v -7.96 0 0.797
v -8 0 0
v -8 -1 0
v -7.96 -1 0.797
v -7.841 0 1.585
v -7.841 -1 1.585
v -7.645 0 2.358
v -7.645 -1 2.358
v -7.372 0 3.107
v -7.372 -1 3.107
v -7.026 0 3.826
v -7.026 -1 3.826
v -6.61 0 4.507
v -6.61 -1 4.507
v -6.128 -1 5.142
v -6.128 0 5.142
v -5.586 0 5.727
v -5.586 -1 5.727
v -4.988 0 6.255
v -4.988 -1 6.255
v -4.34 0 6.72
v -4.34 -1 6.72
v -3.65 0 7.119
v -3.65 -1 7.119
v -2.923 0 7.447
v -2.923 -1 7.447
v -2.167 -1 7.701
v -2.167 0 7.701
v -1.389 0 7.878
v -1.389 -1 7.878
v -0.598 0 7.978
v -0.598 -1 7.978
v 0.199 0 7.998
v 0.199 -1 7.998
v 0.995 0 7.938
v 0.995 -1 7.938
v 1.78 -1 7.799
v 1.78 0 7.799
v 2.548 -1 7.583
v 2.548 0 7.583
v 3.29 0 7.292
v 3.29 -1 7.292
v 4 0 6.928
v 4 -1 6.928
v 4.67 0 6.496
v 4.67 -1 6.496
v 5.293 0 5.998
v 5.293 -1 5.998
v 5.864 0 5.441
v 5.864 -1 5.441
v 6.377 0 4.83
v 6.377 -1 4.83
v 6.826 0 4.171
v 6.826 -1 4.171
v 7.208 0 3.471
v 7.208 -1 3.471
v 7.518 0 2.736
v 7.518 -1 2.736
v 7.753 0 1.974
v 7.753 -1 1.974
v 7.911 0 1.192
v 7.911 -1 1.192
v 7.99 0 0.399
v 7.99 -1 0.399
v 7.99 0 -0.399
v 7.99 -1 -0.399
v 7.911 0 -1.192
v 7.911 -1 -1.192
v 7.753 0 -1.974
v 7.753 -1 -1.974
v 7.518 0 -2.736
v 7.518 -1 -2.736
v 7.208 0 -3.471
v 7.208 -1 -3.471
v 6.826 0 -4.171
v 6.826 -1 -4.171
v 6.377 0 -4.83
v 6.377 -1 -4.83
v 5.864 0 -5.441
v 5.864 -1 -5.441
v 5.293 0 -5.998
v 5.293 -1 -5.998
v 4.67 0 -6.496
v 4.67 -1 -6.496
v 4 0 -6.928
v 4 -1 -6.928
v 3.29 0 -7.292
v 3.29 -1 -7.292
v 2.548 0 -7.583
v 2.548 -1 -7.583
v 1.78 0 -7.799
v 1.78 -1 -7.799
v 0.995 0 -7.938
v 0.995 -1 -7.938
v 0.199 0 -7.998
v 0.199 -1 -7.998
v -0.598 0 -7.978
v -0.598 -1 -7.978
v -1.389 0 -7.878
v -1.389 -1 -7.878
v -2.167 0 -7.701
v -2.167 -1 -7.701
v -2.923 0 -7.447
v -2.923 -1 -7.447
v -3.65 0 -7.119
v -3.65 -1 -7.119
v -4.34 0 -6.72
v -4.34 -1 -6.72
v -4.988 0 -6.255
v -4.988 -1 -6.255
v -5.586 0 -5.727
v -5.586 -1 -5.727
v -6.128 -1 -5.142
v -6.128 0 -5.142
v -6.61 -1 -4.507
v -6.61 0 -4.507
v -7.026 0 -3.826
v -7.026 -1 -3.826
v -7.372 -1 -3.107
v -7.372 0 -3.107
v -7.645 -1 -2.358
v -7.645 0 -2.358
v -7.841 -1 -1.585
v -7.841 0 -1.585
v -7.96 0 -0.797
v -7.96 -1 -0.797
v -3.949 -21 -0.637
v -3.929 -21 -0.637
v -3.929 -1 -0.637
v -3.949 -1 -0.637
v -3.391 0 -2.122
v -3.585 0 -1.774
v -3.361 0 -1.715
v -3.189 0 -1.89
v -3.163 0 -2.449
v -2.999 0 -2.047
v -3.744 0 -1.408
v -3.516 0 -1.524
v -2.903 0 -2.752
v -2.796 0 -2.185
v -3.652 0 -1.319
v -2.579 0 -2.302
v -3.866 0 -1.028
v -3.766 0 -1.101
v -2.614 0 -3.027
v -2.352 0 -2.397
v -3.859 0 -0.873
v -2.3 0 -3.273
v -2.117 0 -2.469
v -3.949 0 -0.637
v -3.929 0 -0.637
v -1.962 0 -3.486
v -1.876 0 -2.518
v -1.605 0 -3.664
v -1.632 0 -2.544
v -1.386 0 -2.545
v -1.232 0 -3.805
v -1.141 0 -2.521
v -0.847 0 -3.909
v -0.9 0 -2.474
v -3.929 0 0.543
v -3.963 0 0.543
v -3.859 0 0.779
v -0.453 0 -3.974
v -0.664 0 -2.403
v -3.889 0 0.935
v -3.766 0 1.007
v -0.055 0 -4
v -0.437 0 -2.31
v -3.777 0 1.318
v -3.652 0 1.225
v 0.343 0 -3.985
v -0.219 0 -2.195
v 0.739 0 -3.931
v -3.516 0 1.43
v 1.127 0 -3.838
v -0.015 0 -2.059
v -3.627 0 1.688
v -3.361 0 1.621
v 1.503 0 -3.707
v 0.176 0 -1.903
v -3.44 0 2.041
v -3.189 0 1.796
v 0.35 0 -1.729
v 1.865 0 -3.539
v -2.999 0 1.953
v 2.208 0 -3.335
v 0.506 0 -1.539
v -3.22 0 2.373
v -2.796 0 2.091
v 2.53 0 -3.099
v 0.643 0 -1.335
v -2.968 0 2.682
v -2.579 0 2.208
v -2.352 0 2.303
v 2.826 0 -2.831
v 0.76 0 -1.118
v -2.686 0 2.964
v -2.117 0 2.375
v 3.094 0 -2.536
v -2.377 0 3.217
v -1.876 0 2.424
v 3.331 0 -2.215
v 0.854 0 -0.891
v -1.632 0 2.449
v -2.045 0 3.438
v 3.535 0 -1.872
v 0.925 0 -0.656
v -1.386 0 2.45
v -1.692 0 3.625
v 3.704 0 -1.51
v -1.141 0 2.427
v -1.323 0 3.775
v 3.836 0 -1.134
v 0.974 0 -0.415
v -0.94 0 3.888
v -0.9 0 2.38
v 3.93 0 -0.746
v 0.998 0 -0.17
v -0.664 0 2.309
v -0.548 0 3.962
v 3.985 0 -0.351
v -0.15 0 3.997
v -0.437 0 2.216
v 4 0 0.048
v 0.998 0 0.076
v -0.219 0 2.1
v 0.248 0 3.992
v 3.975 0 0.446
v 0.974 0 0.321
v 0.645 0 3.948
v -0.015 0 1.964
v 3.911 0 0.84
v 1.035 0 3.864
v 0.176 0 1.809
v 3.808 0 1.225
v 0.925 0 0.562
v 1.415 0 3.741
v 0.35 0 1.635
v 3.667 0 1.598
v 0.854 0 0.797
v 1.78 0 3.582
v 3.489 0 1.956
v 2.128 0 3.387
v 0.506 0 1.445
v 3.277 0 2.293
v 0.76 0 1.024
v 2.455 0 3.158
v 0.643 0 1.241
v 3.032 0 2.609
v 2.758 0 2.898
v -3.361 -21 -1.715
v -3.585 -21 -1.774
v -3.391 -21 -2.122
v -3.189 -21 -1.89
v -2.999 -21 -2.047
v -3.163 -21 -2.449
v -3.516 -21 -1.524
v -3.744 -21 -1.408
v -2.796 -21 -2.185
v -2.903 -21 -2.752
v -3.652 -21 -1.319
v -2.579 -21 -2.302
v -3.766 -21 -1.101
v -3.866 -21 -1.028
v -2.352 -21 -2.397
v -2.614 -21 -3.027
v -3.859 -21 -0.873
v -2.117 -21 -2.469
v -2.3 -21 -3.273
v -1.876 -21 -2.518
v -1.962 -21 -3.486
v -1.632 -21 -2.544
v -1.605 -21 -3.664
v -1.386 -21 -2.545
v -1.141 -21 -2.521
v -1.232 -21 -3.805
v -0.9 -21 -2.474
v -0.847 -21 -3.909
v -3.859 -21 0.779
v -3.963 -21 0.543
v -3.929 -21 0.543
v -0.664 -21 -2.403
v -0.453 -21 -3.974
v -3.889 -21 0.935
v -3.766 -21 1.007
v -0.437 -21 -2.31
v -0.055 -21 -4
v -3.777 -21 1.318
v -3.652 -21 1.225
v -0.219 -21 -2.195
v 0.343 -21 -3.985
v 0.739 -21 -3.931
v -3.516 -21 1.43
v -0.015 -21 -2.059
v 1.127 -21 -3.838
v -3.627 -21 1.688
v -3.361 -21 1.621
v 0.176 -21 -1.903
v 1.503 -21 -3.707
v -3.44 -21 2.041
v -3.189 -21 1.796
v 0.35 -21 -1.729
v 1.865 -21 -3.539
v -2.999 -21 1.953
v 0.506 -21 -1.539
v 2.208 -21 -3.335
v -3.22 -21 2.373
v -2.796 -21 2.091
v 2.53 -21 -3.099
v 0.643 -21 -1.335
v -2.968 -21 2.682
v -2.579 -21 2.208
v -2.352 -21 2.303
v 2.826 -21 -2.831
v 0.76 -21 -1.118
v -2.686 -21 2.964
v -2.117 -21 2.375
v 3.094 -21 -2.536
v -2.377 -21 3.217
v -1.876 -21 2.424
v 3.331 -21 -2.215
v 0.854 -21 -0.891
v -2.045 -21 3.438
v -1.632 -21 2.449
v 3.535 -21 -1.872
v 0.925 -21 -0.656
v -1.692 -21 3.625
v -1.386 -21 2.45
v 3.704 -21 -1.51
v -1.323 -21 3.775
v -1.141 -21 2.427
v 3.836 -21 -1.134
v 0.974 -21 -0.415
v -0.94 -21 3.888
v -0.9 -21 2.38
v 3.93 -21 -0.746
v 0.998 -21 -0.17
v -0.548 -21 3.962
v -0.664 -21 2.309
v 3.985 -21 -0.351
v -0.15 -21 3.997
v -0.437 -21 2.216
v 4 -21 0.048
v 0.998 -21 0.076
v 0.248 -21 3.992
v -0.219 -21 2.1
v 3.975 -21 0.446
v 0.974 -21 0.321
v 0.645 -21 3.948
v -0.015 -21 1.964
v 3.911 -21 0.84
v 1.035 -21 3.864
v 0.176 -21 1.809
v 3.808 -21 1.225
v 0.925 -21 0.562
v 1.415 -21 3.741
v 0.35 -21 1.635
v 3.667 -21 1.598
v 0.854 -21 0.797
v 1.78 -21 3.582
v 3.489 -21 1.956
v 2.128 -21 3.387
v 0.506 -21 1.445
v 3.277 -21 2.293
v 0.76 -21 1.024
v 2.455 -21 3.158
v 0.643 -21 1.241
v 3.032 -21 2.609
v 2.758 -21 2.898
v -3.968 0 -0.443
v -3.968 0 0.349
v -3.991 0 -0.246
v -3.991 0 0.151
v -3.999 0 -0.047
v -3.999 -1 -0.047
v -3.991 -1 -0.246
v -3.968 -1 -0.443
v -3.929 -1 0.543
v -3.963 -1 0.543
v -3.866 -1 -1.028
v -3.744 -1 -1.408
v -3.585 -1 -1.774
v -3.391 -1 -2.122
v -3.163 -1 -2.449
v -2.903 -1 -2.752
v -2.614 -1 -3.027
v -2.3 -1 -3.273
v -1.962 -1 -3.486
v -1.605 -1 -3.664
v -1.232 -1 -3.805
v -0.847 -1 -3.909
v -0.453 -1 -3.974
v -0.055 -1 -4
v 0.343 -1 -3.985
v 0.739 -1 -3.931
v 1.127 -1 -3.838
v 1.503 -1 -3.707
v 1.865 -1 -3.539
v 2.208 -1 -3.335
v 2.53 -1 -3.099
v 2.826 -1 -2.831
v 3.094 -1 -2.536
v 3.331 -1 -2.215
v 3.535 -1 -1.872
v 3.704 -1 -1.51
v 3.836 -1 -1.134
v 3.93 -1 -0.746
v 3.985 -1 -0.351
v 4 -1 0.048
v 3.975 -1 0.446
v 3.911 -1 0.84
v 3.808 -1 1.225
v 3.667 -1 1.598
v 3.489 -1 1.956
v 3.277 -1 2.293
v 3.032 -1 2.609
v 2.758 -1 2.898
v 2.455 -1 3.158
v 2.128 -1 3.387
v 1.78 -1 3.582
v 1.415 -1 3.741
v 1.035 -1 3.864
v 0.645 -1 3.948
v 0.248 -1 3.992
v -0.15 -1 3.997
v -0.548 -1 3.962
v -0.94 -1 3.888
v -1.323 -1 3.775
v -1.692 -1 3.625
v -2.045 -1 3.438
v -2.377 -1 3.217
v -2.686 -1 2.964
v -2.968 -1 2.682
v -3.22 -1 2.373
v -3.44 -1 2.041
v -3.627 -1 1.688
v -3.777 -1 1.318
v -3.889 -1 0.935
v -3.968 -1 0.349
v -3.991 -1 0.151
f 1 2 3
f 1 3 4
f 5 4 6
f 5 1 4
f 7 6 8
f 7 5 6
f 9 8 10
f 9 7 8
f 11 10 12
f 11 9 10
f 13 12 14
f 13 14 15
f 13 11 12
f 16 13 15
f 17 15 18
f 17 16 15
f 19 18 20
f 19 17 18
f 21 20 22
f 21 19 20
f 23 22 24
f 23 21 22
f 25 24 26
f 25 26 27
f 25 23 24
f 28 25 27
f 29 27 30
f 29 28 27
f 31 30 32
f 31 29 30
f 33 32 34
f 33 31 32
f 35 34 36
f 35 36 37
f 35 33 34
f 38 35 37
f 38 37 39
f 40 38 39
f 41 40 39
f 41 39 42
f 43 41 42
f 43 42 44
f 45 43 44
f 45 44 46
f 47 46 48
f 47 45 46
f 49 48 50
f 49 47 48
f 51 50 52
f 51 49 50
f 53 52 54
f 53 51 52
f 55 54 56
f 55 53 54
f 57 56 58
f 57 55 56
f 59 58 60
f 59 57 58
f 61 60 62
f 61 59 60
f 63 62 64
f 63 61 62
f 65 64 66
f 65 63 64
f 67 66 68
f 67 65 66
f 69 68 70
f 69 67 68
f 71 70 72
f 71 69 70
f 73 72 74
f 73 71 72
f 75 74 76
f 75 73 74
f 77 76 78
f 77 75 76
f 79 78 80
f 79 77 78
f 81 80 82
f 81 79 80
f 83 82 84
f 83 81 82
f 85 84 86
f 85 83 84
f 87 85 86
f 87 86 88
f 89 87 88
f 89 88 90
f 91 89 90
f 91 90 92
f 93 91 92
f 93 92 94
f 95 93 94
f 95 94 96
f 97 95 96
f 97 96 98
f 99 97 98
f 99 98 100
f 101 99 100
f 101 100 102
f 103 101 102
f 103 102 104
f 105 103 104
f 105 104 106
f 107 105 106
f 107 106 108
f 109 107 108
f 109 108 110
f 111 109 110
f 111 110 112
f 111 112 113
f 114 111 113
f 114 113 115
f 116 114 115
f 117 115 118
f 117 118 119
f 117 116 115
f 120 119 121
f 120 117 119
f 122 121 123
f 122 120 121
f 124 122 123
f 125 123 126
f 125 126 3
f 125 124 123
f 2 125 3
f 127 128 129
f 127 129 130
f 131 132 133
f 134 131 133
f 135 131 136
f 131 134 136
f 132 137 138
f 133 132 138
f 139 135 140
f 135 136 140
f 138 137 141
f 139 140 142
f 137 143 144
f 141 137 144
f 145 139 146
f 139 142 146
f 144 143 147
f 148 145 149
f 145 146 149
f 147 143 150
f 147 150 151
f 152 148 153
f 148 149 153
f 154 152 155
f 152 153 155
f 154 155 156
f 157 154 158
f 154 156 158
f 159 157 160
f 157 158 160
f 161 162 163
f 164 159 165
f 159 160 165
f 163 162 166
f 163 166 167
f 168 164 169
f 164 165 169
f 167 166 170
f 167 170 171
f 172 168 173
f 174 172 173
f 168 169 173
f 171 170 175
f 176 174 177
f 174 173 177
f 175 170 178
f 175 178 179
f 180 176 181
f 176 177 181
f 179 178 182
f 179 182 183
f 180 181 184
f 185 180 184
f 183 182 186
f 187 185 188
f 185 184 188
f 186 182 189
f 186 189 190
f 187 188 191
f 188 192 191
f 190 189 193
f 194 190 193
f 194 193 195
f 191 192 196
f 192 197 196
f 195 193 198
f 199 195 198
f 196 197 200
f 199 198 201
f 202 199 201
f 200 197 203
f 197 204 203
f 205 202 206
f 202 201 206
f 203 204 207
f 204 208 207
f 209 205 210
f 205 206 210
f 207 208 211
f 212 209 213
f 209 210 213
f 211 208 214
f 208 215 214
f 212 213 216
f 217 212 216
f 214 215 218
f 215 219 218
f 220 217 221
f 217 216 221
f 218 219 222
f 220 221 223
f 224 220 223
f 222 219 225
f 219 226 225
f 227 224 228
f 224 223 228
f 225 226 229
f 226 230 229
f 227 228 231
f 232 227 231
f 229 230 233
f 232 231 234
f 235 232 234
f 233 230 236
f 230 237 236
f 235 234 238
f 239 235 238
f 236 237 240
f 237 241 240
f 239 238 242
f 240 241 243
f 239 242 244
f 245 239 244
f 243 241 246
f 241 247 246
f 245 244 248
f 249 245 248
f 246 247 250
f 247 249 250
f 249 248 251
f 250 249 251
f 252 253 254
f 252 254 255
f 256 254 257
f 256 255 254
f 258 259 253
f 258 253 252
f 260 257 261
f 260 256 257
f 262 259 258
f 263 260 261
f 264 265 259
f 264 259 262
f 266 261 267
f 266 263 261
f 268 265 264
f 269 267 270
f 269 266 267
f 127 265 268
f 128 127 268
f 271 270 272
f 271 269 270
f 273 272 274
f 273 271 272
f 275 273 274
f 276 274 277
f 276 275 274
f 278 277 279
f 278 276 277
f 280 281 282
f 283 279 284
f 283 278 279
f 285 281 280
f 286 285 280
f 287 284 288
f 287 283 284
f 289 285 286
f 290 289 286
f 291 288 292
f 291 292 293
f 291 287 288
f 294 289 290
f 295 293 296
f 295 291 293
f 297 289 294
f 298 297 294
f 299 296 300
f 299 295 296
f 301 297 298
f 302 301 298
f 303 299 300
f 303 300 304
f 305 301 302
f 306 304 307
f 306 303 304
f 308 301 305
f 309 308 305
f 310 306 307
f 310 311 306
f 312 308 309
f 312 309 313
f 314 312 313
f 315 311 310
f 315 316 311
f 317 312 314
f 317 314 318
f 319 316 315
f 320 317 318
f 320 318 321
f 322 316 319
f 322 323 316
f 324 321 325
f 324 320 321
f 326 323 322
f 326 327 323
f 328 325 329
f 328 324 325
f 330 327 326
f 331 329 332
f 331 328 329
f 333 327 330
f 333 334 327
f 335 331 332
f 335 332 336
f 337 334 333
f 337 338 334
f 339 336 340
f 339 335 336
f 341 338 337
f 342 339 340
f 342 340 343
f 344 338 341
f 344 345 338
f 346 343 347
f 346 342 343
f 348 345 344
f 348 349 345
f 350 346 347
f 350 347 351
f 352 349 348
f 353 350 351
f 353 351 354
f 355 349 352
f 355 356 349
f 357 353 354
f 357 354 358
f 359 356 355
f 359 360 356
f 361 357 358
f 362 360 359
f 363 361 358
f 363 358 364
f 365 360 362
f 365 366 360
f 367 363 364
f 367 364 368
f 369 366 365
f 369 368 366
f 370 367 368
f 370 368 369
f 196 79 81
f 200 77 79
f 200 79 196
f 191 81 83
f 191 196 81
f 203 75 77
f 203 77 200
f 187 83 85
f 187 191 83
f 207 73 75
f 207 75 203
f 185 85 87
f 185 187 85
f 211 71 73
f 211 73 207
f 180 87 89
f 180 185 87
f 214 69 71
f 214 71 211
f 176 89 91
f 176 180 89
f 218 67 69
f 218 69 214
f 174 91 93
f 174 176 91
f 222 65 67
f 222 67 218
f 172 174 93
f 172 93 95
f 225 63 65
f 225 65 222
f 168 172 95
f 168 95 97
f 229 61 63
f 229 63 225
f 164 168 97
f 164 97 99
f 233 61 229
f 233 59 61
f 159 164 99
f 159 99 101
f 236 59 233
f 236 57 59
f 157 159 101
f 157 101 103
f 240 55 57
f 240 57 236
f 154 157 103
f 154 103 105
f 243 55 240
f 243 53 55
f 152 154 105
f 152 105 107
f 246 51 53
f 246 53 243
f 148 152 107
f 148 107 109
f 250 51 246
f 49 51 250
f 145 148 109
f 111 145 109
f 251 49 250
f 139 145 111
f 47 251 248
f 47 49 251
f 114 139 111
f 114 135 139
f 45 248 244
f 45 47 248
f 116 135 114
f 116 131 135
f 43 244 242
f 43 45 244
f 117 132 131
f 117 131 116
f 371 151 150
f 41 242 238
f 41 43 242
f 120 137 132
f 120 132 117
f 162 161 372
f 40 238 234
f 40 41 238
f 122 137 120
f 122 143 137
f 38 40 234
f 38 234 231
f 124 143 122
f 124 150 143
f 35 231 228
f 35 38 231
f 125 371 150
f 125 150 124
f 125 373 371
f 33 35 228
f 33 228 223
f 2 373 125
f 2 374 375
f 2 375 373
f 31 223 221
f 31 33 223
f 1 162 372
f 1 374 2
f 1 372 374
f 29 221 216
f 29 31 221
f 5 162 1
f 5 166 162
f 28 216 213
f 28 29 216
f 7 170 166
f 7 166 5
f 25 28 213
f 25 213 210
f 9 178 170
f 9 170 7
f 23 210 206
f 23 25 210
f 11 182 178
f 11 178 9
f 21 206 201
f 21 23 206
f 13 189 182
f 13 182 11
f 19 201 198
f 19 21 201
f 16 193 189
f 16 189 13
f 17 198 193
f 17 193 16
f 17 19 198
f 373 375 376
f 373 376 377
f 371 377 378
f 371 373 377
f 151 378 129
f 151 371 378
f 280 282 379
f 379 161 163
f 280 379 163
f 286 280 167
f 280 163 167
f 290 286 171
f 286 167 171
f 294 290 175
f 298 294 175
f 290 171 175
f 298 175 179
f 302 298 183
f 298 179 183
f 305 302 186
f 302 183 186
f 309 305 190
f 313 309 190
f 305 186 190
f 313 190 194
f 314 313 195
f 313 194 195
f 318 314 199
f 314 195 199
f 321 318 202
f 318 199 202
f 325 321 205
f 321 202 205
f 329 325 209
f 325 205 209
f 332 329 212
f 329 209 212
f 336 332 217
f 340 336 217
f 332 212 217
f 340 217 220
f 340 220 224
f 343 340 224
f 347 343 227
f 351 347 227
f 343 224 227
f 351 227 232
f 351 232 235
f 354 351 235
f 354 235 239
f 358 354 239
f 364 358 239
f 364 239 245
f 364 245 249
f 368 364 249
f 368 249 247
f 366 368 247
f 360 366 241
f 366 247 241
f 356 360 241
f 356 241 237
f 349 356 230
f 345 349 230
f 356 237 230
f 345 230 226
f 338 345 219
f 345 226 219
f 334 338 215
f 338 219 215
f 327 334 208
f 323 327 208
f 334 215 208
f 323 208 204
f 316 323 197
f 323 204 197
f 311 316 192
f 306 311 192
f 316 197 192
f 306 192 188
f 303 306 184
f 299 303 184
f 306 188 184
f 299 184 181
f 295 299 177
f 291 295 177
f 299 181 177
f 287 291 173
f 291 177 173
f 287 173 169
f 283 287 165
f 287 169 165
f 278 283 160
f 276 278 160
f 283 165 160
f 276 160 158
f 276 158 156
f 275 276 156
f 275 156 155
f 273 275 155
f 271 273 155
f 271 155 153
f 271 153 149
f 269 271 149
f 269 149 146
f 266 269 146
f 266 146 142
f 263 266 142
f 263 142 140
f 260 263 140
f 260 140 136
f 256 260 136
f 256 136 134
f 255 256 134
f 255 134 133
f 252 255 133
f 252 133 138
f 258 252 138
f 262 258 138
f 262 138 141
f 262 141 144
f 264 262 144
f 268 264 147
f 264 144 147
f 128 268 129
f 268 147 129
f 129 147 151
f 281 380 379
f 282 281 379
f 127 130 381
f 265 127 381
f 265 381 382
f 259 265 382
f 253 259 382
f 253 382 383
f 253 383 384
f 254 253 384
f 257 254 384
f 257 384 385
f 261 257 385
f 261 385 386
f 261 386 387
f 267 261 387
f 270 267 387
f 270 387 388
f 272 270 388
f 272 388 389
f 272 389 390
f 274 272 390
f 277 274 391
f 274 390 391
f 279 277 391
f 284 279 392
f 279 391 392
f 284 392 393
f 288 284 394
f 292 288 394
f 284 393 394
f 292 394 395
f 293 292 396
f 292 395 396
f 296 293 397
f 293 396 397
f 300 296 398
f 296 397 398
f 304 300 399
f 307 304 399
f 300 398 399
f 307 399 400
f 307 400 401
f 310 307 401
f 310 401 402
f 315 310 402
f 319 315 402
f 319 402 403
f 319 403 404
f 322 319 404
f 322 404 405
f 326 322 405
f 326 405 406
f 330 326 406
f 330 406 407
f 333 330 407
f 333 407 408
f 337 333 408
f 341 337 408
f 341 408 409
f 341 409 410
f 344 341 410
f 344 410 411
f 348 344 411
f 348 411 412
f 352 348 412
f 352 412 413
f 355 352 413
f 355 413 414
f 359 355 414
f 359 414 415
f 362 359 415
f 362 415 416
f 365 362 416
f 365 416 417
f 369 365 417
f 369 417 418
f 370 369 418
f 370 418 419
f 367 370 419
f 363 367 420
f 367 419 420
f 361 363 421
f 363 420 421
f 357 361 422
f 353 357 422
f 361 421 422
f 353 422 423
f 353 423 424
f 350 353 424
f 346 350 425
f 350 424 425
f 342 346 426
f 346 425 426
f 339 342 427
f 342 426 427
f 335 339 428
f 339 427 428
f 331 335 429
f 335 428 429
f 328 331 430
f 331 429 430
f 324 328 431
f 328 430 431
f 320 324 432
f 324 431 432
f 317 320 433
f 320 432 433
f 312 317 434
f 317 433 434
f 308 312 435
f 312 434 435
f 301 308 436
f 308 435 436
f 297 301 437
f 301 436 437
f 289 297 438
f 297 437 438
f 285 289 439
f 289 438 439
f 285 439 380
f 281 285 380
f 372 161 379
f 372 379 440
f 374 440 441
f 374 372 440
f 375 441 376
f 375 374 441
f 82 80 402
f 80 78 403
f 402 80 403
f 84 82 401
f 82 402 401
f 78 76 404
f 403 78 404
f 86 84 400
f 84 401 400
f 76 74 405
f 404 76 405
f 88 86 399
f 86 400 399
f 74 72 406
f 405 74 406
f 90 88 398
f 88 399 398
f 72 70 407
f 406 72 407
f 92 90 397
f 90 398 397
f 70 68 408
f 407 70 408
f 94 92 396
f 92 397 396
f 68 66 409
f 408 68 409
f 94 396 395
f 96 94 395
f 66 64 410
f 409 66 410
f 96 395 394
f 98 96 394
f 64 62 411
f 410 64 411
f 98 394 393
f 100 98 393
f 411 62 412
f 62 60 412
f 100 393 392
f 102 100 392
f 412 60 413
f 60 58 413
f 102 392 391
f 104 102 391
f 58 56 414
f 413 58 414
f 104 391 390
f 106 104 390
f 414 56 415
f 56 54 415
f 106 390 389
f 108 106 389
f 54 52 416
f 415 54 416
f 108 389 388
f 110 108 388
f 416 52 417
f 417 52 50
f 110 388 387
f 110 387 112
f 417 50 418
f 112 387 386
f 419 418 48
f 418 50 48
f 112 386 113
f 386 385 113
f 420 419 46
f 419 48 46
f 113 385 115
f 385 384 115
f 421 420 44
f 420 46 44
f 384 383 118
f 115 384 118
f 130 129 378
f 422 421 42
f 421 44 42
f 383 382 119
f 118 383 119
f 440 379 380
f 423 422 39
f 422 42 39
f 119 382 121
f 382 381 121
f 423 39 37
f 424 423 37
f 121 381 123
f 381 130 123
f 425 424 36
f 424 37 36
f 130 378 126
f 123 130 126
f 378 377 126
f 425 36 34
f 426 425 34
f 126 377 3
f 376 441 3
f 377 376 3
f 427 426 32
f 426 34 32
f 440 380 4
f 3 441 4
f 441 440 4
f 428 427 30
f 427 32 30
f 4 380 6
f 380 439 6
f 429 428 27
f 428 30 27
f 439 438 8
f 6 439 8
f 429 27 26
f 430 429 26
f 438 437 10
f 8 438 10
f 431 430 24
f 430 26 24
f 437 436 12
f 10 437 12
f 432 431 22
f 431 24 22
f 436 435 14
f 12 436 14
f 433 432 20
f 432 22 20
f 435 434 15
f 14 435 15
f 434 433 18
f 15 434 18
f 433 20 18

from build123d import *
from build123d import SkipClean  # not in build123d's __all__

# Parameters (mm, degrees)
F1_DEPTH = 21
F2_R     = 8
F3_DEPTH = 1


with BuildPart() as f1:
    # F0 (on Front) → F1 (new body)
    with BuildSketch(Plane.XZ):
        with BuildLine():
            Line((-3.928567067, -0.6374265649), (-3.9488843202, -0.6374265649))
            ThreePointArc((-3.9488843202, -0.6374265649), (3.9997163197, 0.0476378244), (-3.9629458697, 0.5431942877))
            Line((-3.9629458697, 0.5431942877), (-3.928567067, 0.5431942877))
            ThreePointArc((-3.928567067, 0.5431942877), (1.0007401595, -0.0471161386), (-3.928567067, -0.6374265649))
        make_face()
    extrude(amount=F1_DEPTH)

    # F2 (on face) → F3 (join)
    with BuildSketch(Plane(origin=(0, 0, 0), x_dir=(-1, 0, 0), z_dir=(0, 1, 0))):
        Circle(F2_R)
        with BuildLine():
            ThreePointArc((3.928567067, 0.5431942877), (3.9815237333, 0.250147998), (3.9992598405, -0.0471161386))
            ThreePointArc((3.9992598405, -0.0471161386), (3.9815237333, -0.3443802752), (3.928567067, -0.6374265649))
            Line((3.928567067, -0.6374265649), (3.9488843202, -0.6374265649))
            ThreePointArc((3.9488843202, -0.6374265649), (-3.9997163197, 0.0476378244), (3.9629458697, 0.5431942877))
            Line((3.9629458697, 0.5431942877), (3.928567067, 0.5431942877))
        make_face(mode=Mode.SUBTRACT)
    with SkipClean():  # cleaning this boolean's faces spoils the solid; the shape is the same uncleaned
        extrude(amount=-F3_DEPTH)


solid = f1.part
